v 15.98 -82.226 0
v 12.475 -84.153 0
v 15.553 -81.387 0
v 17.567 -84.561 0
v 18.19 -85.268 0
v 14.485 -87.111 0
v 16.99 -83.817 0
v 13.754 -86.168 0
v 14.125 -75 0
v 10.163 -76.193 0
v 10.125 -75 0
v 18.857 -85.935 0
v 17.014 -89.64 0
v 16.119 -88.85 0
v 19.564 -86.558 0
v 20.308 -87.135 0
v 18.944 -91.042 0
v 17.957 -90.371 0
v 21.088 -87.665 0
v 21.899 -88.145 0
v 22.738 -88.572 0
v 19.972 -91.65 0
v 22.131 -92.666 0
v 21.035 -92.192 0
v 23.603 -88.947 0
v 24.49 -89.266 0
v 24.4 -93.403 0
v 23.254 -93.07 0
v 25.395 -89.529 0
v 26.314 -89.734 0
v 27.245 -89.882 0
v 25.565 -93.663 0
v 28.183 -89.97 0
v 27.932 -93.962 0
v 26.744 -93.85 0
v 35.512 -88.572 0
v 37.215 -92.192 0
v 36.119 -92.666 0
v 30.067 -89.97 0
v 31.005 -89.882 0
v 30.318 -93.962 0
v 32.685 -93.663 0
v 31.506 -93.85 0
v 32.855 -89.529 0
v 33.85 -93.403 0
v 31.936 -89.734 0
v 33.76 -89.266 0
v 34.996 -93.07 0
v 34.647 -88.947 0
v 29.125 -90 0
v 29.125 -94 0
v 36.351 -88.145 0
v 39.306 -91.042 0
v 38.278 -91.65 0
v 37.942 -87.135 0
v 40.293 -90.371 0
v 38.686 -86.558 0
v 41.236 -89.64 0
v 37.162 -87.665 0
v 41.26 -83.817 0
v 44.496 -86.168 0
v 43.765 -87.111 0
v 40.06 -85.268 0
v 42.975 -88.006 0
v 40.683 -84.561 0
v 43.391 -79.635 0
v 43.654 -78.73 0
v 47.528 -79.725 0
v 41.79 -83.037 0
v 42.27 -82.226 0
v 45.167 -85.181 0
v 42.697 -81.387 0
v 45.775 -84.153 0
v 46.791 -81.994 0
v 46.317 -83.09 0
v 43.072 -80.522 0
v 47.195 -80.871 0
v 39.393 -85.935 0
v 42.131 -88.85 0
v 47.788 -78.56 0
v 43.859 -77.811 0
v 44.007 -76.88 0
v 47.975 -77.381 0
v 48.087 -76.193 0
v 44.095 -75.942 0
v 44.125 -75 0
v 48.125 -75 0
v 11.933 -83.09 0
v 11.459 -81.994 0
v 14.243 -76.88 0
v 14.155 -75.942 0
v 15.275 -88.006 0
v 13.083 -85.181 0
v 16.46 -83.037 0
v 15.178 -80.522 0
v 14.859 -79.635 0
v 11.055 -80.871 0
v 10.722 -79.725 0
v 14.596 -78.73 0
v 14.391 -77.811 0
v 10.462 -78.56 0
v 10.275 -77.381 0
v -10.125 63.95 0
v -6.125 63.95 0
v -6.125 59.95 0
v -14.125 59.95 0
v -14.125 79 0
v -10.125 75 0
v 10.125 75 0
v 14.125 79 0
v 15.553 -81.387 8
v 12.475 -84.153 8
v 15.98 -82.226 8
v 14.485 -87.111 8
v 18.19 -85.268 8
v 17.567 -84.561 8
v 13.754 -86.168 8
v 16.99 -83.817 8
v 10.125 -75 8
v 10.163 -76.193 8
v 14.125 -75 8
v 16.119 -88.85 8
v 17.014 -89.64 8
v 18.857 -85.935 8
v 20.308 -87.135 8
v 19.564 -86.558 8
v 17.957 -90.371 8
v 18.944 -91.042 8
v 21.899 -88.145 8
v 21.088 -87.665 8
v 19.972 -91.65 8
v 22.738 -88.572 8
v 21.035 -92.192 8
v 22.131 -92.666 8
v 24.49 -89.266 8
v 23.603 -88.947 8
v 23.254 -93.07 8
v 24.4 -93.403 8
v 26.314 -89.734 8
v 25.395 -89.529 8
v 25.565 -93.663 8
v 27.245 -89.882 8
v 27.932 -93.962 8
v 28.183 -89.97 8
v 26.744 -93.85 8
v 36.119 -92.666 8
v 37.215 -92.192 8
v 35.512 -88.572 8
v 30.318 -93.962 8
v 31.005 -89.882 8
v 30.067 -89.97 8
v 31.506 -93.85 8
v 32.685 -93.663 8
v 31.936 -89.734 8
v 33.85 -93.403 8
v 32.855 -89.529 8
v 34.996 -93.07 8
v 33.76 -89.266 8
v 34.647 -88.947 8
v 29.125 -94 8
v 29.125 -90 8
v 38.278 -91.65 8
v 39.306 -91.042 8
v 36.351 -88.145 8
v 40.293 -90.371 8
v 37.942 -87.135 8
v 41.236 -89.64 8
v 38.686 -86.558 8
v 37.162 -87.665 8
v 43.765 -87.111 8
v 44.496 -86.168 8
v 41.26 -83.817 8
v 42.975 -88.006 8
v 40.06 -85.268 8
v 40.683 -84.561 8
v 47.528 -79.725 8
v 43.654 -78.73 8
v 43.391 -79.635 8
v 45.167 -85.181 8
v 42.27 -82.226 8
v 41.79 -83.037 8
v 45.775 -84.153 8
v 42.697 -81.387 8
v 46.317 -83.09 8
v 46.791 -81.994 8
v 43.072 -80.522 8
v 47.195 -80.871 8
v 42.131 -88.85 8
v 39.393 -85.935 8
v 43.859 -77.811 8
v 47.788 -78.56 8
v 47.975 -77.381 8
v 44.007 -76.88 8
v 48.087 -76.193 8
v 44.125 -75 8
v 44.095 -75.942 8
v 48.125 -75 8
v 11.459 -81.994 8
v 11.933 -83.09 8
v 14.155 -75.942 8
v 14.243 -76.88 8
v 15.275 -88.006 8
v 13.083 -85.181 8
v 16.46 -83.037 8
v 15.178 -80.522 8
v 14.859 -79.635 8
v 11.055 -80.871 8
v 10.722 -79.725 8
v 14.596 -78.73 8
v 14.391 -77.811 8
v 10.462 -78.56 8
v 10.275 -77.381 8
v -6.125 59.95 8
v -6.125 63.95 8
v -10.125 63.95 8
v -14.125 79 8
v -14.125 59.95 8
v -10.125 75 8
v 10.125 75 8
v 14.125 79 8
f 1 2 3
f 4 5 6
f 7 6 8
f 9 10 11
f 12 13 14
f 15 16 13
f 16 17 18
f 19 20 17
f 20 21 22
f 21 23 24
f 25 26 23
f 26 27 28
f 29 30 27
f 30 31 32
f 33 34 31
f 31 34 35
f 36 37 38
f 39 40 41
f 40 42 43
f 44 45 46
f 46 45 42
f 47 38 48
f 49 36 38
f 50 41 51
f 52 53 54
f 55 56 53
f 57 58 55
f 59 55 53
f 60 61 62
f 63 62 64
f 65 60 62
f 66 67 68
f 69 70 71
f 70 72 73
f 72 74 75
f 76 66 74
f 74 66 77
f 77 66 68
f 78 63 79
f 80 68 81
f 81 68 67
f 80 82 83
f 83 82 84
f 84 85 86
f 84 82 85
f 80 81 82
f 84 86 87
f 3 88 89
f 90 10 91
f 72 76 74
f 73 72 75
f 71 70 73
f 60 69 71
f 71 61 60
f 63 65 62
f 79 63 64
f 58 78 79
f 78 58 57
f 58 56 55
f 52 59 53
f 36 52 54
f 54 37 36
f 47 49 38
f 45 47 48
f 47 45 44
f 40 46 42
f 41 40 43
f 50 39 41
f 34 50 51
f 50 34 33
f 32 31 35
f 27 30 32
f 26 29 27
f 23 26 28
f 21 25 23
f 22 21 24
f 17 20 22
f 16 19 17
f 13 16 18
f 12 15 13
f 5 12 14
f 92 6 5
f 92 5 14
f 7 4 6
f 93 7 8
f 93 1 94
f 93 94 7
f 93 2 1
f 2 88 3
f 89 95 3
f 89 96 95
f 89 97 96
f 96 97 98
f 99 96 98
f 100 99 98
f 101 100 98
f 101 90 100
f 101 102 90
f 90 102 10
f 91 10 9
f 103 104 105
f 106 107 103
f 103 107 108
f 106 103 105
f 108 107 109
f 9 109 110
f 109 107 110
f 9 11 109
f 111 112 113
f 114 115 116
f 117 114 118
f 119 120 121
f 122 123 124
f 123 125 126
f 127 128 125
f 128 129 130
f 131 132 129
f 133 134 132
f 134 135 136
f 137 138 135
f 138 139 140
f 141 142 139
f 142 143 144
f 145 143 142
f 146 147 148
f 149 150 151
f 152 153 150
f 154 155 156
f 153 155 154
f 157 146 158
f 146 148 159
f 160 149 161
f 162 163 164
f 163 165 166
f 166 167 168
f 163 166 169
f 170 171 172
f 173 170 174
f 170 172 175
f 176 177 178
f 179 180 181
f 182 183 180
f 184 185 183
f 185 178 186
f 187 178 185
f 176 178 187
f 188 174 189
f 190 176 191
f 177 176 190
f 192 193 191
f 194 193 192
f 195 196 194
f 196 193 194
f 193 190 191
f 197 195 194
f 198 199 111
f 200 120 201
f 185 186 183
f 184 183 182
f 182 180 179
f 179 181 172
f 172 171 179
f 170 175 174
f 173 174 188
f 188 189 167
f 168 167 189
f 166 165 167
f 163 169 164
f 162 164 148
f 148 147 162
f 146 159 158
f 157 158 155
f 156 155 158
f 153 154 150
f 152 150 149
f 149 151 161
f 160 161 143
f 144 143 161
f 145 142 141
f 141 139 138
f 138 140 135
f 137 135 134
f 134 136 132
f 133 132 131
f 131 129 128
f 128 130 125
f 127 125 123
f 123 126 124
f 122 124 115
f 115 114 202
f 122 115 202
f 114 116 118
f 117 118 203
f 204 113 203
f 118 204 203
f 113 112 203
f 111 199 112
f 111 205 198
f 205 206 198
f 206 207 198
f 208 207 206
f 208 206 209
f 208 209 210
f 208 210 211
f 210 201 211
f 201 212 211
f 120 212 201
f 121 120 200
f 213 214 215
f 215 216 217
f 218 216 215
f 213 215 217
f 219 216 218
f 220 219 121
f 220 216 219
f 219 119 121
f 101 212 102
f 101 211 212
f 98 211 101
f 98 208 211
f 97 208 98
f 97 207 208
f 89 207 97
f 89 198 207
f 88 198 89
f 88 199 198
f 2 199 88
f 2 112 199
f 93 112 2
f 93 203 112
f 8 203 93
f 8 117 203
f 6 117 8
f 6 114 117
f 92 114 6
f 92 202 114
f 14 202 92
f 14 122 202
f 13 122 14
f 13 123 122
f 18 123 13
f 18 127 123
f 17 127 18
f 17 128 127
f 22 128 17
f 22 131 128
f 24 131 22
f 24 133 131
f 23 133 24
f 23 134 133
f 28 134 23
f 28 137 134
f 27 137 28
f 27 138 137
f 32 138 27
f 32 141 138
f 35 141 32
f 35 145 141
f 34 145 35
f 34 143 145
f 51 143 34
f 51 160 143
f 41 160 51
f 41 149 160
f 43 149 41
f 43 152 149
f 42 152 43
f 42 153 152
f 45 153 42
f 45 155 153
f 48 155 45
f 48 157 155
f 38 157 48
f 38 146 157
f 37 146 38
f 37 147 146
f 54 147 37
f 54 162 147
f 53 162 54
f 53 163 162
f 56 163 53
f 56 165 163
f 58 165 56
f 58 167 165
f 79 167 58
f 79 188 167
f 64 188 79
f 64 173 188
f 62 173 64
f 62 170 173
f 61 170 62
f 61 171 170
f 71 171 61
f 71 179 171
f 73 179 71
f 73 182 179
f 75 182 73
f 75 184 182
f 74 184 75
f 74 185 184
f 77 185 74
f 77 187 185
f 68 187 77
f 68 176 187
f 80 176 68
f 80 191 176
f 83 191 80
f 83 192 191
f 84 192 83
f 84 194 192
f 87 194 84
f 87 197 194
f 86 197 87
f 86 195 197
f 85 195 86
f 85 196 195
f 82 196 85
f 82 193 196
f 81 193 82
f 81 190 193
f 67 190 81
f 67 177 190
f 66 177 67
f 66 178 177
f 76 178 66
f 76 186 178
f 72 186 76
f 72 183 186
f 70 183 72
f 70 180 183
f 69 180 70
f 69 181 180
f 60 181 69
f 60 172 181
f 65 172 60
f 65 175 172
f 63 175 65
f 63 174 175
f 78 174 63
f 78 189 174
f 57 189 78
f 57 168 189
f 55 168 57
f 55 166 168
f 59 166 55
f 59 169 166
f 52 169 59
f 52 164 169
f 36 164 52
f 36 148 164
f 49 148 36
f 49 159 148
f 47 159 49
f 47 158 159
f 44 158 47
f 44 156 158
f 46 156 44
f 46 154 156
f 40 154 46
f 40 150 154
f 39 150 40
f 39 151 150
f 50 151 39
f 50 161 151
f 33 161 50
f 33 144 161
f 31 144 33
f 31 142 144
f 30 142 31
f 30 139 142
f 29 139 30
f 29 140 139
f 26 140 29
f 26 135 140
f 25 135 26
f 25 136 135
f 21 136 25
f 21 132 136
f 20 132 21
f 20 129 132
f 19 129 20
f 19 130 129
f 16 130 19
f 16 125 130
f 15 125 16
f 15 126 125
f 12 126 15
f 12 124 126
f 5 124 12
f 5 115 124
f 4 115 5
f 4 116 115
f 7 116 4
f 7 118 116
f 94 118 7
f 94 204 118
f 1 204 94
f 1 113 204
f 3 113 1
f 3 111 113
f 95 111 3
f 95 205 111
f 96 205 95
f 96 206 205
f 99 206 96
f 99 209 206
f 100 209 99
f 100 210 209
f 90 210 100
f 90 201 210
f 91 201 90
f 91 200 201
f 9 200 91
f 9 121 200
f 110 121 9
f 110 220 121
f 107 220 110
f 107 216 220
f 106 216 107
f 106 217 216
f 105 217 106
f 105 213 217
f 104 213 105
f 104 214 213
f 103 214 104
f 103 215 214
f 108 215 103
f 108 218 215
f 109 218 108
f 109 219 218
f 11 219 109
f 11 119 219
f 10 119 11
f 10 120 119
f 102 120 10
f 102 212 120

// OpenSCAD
// My measurements:
tolerance = 0.05;
back_h = 11.0 + tolerance;
top_w = 20.2 + tolerance;

// My preferences:
width = 8.0;
thickness = 4.0;
clamp_w = 4.0;
front_h = 150.0;
hook_radius = 15; // interior radius

module hook() {
    union() {
        polygon([
            // inside edges
            [clamp_w, 0 - back_h],
            [0, 0 - back_h],
            [0, 0],
            [top_w, 0],
            [top_w, 0 - front_h],
            // back along the outside
            [top_w + thickness, 0 - front_h],
            [top_w + thickness, 0 + thickness],
            [0 - thickness, 0 + thickness],
            [0 - thickness, 0 - back_h - thickness],
            [clamp_w, 0 - back_h - thickness],
        ]);
        // hook loop
        difference() {
            translate([top_w + hook_radius + thickness, 0 - front_h]) {
                difference() {
                    $fn = 100;
                    circle(hook_radius + thickness);
                    circle(hook_radius);
                }
            }
            translate([top_w, 0 - front_h]) {
                square(2 * (hook_radius + thickness) + tolerance);
            }
        }
    }
};

translate([-1 * top_w / 2, front_h / 2]) {
    union() {
        linear_extrude(width) {
            hook();
        }
    }
}
